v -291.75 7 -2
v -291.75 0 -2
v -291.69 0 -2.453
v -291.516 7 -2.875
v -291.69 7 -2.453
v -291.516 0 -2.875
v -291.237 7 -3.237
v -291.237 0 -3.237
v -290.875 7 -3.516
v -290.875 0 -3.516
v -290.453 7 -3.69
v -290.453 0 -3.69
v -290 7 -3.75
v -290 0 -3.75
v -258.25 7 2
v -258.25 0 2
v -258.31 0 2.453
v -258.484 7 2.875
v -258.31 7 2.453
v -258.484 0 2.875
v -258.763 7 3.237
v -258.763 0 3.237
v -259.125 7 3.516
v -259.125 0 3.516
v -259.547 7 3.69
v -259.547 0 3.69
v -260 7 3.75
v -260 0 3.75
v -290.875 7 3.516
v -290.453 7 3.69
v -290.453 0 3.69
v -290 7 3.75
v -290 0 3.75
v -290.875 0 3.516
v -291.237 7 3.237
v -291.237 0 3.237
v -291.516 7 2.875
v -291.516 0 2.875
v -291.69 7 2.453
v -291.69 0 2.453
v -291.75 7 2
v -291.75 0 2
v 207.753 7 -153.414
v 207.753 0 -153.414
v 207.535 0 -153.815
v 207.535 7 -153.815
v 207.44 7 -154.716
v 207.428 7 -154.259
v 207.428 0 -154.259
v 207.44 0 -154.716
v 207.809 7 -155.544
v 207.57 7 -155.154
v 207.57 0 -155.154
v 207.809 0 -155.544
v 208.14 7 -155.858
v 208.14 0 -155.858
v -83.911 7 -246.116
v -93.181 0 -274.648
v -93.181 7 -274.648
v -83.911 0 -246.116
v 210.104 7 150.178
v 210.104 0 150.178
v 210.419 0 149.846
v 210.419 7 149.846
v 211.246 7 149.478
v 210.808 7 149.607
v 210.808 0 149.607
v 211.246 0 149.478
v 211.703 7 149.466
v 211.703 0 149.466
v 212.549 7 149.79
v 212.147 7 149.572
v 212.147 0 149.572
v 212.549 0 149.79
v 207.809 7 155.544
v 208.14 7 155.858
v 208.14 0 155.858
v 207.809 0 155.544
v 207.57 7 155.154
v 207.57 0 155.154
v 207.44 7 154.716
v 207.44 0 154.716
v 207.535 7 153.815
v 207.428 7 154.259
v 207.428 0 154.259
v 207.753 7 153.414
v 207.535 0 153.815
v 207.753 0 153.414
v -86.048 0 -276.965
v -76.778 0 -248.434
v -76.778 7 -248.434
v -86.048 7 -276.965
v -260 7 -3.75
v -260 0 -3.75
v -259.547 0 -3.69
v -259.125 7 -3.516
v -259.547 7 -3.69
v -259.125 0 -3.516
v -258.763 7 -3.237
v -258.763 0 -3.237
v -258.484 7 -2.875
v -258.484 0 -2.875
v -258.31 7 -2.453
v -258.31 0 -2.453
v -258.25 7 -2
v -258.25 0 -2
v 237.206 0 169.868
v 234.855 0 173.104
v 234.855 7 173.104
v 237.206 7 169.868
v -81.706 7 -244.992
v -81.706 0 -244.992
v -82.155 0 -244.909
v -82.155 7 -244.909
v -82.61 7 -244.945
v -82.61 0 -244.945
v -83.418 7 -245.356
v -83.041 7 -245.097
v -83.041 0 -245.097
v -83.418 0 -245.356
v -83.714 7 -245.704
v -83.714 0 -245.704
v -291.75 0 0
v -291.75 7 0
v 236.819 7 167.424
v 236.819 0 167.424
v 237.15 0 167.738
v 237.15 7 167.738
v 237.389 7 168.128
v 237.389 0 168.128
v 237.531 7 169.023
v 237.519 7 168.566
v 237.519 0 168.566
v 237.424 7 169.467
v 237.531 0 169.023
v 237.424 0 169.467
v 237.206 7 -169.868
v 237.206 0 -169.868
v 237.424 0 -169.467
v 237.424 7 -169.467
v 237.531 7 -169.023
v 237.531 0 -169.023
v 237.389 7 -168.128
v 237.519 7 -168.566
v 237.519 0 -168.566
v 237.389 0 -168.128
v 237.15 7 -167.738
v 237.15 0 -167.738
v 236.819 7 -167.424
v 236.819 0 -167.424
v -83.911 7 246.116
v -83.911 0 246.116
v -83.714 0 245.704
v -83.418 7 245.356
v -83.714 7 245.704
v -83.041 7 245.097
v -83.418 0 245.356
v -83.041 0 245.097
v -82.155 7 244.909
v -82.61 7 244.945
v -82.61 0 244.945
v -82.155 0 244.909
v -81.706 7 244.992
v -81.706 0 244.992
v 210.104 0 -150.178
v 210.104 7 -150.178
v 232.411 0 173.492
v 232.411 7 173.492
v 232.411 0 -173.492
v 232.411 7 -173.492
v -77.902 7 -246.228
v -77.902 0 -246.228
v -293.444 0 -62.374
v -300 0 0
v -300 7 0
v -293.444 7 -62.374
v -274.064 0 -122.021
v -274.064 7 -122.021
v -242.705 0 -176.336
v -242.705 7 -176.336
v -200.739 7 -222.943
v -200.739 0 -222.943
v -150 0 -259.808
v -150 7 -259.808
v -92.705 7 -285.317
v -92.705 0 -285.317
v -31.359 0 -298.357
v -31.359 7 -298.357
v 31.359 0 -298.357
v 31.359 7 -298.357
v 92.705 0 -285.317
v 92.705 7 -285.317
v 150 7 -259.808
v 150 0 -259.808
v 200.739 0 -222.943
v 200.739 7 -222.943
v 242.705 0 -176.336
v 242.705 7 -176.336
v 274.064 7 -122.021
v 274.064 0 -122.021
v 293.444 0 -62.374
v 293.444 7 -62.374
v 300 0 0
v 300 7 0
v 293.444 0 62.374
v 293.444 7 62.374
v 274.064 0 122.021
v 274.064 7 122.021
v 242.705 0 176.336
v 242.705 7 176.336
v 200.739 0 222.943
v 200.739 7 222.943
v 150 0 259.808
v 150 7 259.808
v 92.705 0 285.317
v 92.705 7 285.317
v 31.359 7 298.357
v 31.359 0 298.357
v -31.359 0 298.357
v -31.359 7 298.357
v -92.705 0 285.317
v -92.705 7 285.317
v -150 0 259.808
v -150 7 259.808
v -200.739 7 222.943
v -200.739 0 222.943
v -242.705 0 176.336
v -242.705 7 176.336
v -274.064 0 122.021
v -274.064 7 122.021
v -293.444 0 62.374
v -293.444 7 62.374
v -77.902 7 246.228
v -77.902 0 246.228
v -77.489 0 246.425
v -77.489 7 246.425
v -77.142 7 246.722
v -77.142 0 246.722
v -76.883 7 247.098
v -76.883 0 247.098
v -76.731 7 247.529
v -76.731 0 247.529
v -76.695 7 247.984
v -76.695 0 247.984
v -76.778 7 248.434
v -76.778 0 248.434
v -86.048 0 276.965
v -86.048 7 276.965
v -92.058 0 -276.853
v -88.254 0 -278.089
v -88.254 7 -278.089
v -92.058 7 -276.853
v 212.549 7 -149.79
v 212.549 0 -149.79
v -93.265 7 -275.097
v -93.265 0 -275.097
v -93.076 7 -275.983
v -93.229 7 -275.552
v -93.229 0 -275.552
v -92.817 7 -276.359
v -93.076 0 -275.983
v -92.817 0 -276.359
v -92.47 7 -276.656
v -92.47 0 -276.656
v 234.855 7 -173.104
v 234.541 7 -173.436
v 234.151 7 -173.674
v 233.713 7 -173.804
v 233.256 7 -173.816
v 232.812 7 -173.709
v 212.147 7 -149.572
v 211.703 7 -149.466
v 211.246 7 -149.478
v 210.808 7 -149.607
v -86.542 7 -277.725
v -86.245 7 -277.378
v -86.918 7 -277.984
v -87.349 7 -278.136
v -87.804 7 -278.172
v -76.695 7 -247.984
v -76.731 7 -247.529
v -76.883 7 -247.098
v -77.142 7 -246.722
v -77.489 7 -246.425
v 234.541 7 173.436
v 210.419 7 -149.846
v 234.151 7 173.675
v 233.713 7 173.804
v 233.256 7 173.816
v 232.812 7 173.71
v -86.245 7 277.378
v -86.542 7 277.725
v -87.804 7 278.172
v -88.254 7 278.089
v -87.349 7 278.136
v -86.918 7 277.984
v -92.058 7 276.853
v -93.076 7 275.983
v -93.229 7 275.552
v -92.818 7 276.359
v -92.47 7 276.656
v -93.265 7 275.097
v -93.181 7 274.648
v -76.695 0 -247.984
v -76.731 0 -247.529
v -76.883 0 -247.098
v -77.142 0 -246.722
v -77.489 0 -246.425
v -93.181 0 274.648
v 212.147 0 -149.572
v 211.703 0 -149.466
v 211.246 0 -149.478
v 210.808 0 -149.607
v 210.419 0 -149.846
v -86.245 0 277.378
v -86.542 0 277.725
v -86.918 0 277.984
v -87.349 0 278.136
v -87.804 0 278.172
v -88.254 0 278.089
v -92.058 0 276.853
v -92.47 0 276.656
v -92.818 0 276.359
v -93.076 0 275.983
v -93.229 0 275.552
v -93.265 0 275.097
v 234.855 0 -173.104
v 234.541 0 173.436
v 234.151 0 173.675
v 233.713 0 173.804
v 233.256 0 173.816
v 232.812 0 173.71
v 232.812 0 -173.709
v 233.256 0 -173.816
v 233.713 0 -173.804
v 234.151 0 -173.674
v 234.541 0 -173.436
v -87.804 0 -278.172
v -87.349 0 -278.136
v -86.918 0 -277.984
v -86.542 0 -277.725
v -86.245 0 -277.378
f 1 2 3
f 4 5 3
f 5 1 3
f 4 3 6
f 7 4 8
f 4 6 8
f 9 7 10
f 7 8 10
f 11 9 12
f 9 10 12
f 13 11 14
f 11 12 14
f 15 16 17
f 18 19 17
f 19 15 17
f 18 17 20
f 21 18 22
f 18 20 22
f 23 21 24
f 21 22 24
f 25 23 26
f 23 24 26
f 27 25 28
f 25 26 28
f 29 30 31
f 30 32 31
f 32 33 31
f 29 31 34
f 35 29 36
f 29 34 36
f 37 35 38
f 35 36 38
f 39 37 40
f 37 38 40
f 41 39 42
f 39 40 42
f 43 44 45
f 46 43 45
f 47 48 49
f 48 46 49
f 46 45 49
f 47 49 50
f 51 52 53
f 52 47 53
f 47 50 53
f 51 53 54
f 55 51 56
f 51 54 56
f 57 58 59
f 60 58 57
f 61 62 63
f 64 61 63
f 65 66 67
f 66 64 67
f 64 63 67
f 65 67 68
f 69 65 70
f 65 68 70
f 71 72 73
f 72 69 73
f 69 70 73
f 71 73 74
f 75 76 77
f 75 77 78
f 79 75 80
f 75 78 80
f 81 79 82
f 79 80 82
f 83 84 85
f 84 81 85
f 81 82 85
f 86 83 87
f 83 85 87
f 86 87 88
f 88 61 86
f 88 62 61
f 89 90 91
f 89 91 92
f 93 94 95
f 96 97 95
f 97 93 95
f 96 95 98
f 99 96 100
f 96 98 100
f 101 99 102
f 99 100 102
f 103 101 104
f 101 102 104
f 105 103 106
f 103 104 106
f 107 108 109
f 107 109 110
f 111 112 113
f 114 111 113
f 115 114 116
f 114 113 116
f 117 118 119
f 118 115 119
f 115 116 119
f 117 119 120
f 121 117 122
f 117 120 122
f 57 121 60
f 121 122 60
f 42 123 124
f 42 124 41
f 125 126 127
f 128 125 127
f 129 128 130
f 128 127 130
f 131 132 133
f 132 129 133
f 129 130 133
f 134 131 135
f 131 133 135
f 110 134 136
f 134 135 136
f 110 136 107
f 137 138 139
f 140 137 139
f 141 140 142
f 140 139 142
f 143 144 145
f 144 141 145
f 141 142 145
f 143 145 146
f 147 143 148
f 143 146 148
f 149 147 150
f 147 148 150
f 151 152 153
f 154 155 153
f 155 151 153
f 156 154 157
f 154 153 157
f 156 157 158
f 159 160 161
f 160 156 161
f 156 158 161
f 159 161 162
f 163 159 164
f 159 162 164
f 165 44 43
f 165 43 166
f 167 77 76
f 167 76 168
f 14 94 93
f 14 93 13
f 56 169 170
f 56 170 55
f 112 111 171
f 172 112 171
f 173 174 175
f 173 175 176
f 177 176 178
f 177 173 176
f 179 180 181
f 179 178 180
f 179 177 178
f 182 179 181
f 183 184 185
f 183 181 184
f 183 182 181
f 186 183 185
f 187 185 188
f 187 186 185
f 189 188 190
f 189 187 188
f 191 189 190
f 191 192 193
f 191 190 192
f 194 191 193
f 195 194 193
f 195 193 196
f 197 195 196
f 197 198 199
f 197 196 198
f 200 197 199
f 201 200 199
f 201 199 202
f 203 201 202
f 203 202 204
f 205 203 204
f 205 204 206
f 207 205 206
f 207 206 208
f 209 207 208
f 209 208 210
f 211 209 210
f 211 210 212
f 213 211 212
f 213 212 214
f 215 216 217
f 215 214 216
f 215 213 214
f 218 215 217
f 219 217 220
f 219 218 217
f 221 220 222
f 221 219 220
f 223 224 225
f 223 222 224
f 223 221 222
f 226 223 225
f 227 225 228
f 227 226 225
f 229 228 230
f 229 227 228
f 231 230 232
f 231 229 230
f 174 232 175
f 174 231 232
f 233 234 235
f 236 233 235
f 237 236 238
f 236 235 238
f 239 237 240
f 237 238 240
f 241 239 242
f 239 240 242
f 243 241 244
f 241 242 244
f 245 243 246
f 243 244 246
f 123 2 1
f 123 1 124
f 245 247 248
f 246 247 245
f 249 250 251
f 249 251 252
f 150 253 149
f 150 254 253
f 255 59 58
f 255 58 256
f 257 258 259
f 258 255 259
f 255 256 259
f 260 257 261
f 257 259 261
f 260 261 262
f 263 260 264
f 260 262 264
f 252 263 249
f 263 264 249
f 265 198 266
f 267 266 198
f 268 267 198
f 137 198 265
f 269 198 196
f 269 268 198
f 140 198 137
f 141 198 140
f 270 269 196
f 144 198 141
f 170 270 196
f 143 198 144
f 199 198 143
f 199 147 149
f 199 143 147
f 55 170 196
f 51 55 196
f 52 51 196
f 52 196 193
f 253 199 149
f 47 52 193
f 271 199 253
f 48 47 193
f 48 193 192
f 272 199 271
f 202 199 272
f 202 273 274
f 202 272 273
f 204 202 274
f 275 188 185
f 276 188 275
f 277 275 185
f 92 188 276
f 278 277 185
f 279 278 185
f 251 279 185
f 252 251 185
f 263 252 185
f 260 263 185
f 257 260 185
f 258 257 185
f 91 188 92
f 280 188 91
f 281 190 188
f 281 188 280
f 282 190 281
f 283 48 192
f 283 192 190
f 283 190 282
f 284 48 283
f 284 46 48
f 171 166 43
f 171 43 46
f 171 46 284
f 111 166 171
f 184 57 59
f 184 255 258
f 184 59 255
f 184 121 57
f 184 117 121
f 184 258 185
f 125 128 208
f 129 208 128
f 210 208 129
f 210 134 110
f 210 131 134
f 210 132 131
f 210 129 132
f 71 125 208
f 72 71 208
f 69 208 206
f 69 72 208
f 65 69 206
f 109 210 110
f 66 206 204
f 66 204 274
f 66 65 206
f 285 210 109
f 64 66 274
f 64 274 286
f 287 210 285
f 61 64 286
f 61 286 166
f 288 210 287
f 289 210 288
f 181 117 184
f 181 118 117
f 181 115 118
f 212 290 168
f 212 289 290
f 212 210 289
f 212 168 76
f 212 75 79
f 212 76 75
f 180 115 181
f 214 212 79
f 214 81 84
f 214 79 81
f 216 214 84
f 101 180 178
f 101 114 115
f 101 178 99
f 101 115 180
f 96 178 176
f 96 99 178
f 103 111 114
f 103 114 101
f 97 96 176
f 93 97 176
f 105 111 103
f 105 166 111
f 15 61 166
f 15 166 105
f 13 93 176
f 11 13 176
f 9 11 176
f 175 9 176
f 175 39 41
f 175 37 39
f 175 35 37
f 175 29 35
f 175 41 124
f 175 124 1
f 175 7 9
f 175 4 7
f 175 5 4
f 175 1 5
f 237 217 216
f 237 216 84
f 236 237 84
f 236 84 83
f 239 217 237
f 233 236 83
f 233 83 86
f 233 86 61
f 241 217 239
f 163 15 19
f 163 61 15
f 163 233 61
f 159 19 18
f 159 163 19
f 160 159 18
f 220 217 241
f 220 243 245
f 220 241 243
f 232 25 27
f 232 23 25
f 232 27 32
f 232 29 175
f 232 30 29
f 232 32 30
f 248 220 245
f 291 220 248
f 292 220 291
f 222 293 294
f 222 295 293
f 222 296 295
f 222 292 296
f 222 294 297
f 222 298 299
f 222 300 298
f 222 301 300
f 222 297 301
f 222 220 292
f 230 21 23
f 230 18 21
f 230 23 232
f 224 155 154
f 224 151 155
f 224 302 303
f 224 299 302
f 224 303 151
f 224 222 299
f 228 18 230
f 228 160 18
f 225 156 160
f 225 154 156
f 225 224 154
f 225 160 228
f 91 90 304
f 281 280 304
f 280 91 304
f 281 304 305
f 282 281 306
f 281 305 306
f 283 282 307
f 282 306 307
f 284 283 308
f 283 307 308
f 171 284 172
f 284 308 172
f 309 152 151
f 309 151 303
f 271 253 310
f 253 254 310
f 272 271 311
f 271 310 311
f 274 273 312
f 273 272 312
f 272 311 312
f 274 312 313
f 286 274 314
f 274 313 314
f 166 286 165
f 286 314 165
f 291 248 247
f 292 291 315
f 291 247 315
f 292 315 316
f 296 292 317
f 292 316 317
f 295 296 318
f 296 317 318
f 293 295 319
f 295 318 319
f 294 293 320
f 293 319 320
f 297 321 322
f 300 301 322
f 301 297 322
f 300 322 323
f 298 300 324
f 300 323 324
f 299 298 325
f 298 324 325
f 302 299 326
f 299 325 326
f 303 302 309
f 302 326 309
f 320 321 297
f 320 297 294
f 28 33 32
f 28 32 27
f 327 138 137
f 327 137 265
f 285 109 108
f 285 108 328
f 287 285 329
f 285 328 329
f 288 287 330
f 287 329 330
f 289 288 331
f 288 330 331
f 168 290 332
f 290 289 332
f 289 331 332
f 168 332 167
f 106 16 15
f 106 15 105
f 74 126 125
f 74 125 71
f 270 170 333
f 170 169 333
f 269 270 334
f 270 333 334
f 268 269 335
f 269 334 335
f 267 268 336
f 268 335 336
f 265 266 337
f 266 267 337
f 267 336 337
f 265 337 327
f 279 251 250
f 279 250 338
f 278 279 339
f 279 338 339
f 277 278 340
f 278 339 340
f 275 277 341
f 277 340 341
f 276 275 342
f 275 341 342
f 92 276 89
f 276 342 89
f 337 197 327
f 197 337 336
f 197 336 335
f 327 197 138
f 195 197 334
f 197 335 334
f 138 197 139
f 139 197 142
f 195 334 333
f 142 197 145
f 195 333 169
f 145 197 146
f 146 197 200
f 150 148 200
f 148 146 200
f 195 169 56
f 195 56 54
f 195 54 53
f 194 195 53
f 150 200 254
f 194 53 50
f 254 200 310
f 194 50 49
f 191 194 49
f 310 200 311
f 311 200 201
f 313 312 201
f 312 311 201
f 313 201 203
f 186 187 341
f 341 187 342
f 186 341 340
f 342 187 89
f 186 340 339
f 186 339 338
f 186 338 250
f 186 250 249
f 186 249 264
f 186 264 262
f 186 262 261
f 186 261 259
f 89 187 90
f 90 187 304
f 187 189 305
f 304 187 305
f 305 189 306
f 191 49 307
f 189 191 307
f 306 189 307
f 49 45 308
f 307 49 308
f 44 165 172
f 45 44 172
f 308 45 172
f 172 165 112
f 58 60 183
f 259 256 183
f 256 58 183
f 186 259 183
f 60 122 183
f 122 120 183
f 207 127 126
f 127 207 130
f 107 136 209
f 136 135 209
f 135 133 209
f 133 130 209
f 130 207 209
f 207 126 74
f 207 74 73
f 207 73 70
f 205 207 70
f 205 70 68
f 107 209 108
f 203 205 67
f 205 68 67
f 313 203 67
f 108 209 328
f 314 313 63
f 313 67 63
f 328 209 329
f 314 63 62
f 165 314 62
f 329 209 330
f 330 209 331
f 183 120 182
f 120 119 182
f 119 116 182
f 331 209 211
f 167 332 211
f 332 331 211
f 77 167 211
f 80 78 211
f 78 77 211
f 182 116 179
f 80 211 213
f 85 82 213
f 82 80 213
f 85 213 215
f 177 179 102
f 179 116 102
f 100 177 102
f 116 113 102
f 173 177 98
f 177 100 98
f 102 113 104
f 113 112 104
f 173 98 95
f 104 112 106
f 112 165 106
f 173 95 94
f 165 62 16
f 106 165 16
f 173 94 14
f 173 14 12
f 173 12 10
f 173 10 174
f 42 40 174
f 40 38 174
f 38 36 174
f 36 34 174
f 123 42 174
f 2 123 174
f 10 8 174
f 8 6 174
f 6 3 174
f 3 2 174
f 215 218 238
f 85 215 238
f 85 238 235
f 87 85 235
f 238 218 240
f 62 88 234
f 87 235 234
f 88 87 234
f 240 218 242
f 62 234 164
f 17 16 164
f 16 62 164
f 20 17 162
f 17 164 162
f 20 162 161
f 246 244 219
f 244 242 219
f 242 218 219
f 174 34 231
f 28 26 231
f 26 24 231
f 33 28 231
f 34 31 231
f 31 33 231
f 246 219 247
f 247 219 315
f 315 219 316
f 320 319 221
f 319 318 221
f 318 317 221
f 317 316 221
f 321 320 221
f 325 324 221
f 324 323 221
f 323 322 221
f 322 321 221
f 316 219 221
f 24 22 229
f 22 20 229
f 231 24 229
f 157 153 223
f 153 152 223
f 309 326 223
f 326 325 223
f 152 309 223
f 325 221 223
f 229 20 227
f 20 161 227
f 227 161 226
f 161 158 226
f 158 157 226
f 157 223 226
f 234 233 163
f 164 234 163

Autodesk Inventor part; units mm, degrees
ref_plane "YZ Plane" through (0, 0, 0) normal (1, 0, 0) x (0, 1, 0)
ref_plane "XZ Plane" through (0, 0, 0) normal (0, 1, 0) x (-1, 0, 0)
ref_plane "XY Plane" through (0, 0, 0) normal (0, 0, 1) x (1, 0, 0)
sketch "Sketch1" plane through (0, 0, 0) normal (0, 1, 0) x (-1, 0, 0)
  circle A0 centre (0, 0) radius 300
  line L0 (290, 3.75) -> (260, 3.75)
  line L1 (260, -3.75) -> (290, -3.75)
  arc A1 (291.75, 2) -> (290, 3.75) centre (290, 2) ccw
  arc A2 (290, -3.75) -> (291.75, -2) centre (290, -2) ccw
  arc A3 (258.25, -2) -> (260, -3.75) centre (260, -2) ccw
  arc A4 (260, 3.75) -> (258.25, 2) centre (260, 2) ccw
  line L2 (258.25, 2) -> (258.25, -2)
  line L3 (291.75, -2) -> (291.75, 2)
  line L4 (306.241, 0) -> (300, 0)
  line L5 (300, 0) -> (281.7438, 0)
  line L6 (86.0485, 276.9652) -> (76.778, 248.4335)
  arc A5 (88.2536, 278.0888) -> (86.0485, 276.9652) centre (87.7128, 276.4244) ccw
  line L7 (92.0578, 276.8527) -> (88.2536, 278.0888)
  line L8 (83.9109, 246.1159) -> (93.1814, 274.6476)
  arc A6 (93.1814, 274.6476) -> (92.0578, 276.8527) centre (91.517, 275.1884) ccw
  arc A7 (76.778, 248.4335) -> (77.9015, 246.2284) centre (78.4423, 247.8927) ccw
  line L9 (77.9015, 246.2284) -> (81.7058, 244.9923)
  arc A8 (81.7058, 244.9923) -> (83.9109, 246.1159) centre (82.2465, 246.6567) ccw
  line L10 (-236.8191, 167.4239) -> (-212.5486, 149.7904)
  arc A9 (-237.2063, 169.8683) -> (-236.8191, 167.4239) centre (-235.7905, 168.8397) ccw
  line L11 (-234.8551, 173.1044) -> (-237.2063, 169.8683)
  line L12 (-208.1402, 155.858) -> (-232.4107, 173.4915)
  arc A10 (-232.4107, 173.4915) -> (-234.8551, 173.1044) centre (-233.4394, 172.0758) ccw
  arc A11 (-212.5486, 149.7904) -> (-210.1042, 150.1775) centre (-211.52, 151.2061) ccw
  line L13 (-210.1042, 150.1775) -> (-207.7531, 153.4136)
  arc A12 (-207.7531, 153.4136) -> (-208.1402, 155.858) centre (-209.1688, 154.4422) ccw
  line L14 (-232.4107, -173.4915) -> (-208.1402, -155.858)
  arc A13 (-234.8551, -173.1044) -> (-232.4107, -173.4915) centre (-233.4394, -172.0758) ccw
  line L15 (-237.2063, -169.8683) -> (-234.8551, -173.1044)
  line L16 (-212.5486, -149.7904) -> (-236.8191, -167.4239)
  arc A14 (-236.8191, -167.4239) -> (-237.2063, -169.8683) centre (-235.7905, -168.8397) ccw
  arc A15 (-208.1402, -155.858) -> (-207.7531, -153.4136) centre (-209.1688, -154.4422) ccw
  line L17 (-207.7531, -153.4136) -> (-210.1042, -150.1775)
  arc A16 (-210.1042, -150.1775) -> (-212.5486, -149.7904) centre (-211.52, -151.2061) ccw
  line L18 (93.1814, -274.6476) -> (83.9109, -246.1159)
  arc A17 (92.0578, -276.8527) -> (93.1814, -274.6476) centre (91.517, -275.1884) ccw
  line L19 (88.2536, -278.0888) -> (92.0578, -276.8527)
  line L20 (76.778, -248.4335) -> (86.0485, -276.9652)
  arc A18 (86.0485, -276.9652) -> (88.2536, -278.0888) centre (87.7128, -276.4244) ccw
  arc A19 (83.9109, -246.1159) -> (81.7058, -244.9923) centre (82.2465, -246.6567) ccw
  line L21 (81.7058, -244.9923) -> (77.9015, -246.2284)
  arc A20 (77.9015, -246.2284) -> (76.778, -248.4335) centre (78.4423, -247.8927) ccw
  point P0 (87.0636, 267.9543)
  point P1 (-227.9355, 165.6049)
  point P2 (-227.9355, -165.6049)
  point P3 (87.0636, -267.9543)
  dimension "d3" = 7.5
  dimension "d6" = 30
  dimension "d7" = 3.5
  dimension "d8" = 3.5
  dimension "d26" = 8.25
  dimension "d27" = 33.5
  dimension "d28" = 7.5
extrude "Extrusion1" add sketch "Sketch1" along normal blind 7
properties part number "Roof - V2"
